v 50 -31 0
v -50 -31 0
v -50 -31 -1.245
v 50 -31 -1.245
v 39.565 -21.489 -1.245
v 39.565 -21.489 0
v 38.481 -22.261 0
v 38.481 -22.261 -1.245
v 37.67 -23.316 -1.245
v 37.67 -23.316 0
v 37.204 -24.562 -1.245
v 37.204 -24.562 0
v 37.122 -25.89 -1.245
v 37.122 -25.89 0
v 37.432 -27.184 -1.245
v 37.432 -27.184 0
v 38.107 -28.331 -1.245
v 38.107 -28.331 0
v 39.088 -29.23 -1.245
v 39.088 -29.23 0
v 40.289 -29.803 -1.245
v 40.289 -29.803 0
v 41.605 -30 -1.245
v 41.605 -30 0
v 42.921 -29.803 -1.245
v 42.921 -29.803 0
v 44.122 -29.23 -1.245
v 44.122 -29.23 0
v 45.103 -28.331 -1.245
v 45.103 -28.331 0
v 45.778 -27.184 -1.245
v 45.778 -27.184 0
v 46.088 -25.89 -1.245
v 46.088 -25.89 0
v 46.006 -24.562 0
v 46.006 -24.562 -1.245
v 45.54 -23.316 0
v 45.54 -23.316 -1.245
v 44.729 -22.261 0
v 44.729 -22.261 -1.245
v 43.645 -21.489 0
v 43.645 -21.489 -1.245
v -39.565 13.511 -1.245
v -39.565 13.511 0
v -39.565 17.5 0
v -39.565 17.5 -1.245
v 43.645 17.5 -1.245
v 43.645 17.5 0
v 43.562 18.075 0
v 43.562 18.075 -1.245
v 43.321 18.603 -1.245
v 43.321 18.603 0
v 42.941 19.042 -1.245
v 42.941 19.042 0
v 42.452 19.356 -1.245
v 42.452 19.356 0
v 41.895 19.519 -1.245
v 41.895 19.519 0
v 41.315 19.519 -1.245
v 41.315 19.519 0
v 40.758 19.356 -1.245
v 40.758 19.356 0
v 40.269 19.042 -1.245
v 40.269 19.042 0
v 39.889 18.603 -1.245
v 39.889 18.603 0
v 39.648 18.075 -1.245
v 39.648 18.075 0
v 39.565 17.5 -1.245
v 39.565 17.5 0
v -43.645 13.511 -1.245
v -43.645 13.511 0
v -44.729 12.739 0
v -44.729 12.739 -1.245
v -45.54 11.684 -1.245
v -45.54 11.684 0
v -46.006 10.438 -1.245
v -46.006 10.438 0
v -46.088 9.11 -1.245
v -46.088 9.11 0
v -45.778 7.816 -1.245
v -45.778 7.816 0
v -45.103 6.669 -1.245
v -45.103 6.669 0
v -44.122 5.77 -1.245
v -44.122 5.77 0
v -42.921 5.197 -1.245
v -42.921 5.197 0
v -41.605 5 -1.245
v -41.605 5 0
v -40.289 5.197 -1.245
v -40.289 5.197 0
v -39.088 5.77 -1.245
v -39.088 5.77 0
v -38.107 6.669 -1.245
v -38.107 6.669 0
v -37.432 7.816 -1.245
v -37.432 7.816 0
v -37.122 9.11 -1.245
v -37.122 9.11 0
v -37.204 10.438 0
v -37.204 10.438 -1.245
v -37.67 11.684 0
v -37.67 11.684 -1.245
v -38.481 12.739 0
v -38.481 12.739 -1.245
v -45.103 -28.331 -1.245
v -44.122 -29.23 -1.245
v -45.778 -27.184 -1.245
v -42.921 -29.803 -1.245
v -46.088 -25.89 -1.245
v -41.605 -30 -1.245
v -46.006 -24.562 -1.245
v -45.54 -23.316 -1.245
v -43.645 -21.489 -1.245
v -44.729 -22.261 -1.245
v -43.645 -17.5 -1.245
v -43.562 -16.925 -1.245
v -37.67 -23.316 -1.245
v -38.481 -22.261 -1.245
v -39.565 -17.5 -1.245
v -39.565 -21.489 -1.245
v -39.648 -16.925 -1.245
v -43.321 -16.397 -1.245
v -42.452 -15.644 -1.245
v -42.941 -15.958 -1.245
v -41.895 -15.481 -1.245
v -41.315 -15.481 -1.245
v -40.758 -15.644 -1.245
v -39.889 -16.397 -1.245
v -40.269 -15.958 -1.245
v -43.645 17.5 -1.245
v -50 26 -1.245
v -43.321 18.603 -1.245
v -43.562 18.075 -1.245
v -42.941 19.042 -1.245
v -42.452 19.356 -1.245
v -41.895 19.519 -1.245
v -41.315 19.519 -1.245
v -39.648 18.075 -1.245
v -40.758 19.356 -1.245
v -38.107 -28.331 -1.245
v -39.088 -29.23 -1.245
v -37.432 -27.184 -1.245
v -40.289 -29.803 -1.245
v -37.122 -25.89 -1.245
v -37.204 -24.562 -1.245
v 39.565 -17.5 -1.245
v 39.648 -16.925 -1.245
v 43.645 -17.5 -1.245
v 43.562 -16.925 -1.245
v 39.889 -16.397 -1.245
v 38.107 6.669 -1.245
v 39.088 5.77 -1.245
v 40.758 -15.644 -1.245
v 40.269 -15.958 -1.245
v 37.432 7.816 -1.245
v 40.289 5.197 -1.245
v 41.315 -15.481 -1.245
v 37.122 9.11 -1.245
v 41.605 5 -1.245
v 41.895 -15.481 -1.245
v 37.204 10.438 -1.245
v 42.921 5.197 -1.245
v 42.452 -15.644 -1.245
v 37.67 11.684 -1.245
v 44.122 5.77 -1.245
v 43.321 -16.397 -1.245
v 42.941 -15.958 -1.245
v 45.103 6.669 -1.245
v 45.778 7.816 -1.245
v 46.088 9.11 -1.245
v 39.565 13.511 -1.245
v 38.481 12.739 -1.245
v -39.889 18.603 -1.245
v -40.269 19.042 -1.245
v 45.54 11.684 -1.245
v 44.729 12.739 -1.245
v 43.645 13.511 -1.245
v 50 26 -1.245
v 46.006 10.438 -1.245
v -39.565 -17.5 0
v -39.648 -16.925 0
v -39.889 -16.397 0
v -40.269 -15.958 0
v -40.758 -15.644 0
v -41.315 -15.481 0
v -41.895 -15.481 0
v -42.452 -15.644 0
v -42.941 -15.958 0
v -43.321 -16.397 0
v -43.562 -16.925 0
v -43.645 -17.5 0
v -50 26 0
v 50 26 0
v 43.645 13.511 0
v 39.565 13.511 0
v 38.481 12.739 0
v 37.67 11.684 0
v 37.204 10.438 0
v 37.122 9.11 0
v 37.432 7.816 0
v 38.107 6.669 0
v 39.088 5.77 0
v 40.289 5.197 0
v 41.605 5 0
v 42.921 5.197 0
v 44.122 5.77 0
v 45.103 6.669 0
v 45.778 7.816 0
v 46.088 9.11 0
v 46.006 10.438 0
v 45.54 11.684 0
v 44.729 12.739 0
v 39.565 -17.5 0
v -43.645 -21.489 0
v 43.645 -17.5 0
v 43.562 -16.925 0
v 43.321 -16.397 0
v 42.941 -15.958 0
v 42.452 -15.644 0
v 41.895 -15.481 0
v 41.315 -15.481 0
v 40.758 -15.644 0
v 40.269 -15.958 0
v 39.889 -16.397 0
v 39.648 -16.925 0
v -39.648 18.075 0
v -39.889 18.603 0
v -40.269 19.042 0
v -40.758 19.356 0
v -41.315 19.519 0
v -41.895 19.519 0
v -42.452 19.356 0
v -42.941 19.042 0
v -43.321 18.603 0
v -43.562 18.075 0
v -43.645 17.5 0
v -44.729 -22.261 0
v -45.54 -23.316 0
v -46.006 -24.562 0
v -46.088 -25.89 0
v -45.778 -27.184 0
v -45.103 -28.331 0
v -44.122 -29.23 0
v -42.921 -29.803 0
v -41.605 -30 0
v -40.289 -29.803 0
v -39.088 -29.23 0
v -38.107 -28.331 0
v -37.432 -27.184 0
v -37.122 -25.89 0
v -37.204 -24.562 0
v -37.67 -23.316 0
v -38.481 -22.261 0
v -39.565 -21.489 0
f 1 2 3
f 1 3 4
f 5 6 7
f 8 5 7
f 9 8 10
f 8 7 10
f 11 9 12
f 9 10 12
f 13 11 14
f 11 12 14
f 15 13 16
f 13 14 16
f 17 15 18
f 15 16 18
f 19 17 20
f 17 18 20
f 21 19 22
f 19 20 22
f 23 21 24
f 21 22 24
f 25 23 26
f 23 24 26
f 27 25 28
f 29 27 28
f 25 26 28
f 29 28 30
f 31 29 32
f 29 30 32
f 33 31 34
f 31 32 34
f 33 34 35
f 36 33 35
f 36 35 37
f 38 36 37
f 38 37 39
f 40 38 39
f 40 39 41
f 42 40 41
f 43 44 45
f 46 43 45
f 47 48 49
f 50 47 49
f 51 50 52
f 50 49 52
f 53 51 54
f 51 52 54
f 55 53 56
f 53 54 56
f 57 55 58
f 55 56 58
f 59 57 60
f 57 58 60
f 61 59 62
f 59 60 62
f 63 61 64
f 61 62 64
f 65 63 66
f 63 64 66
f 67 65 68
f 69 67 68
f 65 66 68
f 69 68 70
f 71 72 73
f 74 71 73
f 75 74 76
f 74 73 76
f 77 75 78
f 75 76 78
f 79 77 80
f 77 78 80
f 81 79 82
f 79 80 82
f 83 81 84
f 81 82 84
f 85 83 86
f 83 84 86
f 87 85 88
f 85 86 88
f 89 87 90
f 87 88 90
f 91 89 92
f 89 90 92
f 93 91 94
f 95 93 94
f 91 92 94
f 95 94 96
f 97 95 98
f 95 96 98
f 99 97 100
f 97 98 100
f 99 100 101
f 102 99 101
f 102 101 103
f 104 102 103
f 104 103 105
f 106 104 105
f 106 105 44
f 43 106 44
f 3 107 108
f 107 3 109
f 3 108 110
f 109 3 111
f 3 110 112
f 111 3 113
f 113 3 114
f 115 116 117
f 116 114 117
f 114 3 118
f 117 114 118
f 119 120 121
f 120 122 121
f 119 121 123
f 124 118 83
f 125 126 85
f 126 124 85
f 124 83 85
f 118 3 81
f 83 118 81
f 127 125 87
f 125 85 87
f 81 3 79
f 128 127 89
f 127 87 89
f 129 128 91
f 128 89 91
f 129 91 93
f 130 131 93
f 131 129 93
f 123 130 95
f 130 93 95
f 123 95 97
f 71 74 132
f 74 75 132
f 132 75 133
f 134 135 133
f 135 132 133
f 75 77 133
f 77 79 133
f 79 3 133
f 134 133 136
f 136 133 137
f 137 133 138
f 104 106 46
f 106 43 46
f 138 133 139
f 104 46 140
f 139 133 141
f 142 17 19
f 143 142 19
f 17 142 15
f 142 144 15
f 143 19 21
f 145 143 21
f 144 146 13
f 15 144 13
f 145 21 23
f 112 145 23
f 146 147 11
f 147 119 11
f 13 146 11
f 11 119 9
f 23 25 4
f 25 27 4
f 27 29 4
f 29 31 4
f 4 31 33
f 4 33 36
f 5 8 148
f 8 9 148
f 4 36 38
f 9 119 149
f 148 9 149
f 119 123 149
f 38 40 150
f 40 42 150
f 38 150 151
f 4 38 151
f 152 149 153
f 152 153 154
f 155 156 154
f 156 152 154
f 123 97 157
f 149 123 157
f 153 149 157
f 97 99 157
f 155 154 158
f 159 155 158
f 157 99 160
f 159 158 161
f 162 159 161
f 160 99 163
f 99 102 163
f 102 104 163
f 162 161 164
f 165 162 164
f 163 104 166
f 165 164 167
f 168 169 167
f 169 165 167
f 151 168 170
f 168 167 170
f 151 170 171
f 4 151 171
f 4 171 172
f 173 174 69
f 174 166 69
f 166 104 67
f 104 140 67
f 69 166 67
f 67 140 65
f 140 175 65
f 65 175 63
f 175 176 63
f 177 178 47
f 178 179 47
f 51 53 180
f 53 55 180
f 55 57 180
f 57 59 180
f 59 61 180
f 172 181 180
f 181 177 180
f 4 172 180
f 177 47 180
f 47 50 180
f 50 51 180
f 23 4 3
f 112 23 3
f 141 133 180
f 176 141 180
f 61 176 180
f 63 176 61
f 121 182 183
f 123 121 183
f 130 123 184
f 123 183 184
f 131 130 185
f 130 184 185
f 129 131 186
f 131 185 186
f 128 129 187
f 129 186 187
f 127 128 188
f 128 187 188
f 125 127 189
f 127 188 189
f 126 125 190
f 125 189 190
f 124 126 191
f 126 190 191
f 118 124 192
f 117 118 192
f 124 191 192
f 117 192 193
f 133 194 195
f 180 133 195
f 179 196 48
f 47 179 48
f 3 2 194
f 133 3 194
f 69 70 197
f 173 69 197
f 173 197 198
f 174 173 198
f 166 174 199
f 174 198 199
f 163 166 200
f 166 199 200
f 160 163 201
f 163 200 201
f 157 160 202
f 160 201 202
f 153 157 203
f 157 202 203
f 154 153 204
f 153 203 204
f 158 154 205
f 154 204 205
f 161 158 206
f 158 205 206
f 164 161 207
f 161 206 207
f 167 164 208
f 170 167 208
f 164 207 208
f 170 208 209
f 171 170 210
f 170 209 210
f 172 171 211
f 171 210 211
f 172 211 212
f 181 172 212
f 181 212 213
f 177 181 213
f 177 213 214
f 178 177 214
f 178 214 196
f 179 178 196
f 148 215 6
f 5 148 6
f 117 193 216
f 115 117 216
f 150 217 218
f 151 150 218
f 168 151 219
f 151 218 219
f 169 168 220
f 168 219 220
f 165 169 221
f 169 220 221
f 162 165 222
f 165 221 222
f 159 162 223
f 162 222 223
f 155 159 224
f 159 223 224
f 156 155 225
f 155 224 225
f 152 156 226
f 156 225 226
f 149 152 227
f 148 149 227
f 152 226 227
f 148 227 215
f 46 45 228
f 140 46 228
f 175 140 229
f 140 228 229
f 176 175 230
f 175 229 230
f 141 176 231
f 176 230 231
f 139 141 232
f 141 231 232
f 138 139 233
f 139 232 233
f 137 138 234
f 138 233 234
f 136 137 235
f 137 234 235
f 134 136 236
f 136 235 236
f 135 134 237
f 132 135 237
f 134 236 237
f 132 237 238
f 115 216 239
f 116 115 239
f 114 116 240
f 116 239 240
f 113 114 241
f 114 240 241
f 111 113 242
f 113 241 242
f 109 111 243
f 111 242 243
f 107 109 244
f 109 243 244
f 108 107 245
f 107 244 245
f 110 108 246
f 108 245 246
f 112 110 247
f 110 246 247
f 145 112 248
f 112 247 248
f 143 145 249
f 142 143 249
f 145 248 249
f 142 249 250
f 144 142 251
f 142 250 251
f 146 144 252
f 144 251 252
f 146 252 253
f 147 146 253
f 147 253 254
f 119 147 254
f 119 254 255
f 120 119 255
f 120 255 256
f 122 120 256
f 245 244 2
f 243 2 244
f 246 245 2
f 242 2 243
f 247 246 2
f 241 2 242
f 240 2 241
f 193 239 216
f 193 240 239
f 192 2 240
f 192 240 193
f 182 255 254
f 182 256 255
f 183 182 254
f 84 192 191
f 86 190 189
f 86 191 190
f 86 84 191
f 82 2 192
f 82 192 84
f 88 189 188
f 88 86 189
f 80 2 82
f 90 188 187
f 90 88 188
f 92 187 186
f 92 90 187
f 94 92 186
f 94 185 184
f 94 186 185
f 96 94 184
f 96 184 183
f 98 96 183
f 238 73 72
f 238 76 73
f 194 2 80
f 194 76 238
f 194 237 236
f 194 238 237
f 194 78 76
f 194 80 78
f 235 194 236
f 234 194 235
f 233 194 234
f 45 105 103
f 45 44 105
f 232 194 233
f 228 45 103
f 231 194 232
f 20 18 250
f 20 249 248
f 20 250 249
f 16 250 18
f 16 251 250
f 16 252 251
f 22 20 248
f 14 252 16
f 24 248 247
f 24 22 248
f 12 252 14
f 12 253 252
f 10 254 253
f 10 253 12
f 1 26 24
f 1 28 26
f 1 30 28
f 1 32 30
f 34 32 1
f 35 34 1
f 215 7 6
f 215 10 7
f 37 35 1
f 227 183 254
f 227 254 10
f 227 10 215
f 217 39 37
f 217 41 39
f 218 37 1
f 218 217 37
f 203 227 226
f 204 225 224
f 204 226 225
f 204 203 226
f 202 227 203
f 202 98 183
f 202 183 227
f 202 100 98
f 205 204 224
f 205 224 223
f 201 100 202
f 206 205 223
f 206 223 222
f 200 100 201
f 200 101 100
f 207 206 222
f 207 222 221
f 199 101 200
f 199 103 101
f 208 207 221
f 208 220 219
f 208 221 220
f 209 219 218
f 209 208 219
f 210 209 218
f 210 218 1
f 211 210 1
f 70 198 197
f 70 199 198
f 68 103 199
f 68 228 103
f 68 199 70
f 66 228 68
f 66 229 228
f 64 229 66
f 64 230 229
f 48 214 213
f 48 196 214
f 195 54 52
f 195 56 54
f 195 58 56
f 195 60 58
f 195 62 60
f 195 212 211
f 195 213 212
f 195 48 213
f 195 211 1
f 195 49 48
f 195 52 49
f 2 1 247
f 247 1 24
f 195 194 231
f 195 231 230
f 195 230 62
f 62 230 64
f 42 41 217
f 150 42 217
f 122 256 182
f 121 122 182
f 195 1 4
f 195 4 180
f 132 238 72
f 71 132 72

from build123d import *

# Parameters (mm, degrees)
SKETCH1_W          = 100
SKETCH1_H          = 62
BASE_FLANGE1_DEPTH = 1.245
CUT_EXTRUDE7_DEPTH = 10
MOVE_FACE1_BY      = 5


# Sheet-metal steps are written as plain solids
with BuildPart() as part:
    # Sketch1 → Base-Flange1 (new body)
    with BuildSketch(Plane.XY):
        Rectangle(SKETCH1_W, SKETCH1_H)
    extrude(amount=-BASE_FLANGE1_DEPTH)

    # Sketch6 → Cut-Extrude7 (cut)
    with BuildSketch(Plane.XY):
        with BuildLine():
            Line((-43.645, 17.5), (-43.645, 13.511034779))
            ThreePointArc((-43.645, 13.511034779), (-41.605, 5), (-39.565, 13.511034779))
            Line((-39.565, 13.511034779), (-39.565, 17.5))
            ThreePointArc((-39.565, 17.5), (-41.605, 19.54), (-43.645, 17.5))
        make_face()
        with BuildLine():
            Line((39.565, 17.5), (39.565, 13.511034779))
            ThreePointArc((39.565, 13.511034779), (41.605, 5), (43.645, 13.511034779))
            Line((43.645, 13.511034779), (43.645, 17.5))
            ThreePointArc((43.645, 17.5), (41.605, 19.54), (39.565, 17.5))
        make_face()
        with BuildLine():
            Line((-43.645, -17.5), (-43.645, -21.488965221))
            ThreePointArc((-43.645, -21.488965221), (-41.605, -30), (-39.565, -21.488965221))
            Line((-39.565, -21.488965221), (-39.565, -17.5))
            ThreePointArc((-39.565, -17.5), (-41.605, -15.46), (-43.645, -17.5))
        make_face()
        with BuildLine():
            Line((39.565, -17.5), (39.565, -21.488965221))
            ThreePointArc((39.565, -21.488965221), (41.605, -30), (43.645, -21.488965221))
            Line((43.645, -21.488965221), (43.645, -17.5))
            ThreePointArc((43.645, -17.5), (41.605, -15.46), (39.565, -17.5))
        make_face()
    extrude(amount=-CUT_EXTRUDE7_DEPTH, mode=Mode.SUBTRACT)

    # Move Face1: a face moved inward by 5.0
    extrude(part.faces().sort_by_distance((0, 31, -0.6225))[0], amount=MOVE_FACE1_BY, dir=(0, -1, 0), mode=Mode.SUBTRACT)


solid = part.part
